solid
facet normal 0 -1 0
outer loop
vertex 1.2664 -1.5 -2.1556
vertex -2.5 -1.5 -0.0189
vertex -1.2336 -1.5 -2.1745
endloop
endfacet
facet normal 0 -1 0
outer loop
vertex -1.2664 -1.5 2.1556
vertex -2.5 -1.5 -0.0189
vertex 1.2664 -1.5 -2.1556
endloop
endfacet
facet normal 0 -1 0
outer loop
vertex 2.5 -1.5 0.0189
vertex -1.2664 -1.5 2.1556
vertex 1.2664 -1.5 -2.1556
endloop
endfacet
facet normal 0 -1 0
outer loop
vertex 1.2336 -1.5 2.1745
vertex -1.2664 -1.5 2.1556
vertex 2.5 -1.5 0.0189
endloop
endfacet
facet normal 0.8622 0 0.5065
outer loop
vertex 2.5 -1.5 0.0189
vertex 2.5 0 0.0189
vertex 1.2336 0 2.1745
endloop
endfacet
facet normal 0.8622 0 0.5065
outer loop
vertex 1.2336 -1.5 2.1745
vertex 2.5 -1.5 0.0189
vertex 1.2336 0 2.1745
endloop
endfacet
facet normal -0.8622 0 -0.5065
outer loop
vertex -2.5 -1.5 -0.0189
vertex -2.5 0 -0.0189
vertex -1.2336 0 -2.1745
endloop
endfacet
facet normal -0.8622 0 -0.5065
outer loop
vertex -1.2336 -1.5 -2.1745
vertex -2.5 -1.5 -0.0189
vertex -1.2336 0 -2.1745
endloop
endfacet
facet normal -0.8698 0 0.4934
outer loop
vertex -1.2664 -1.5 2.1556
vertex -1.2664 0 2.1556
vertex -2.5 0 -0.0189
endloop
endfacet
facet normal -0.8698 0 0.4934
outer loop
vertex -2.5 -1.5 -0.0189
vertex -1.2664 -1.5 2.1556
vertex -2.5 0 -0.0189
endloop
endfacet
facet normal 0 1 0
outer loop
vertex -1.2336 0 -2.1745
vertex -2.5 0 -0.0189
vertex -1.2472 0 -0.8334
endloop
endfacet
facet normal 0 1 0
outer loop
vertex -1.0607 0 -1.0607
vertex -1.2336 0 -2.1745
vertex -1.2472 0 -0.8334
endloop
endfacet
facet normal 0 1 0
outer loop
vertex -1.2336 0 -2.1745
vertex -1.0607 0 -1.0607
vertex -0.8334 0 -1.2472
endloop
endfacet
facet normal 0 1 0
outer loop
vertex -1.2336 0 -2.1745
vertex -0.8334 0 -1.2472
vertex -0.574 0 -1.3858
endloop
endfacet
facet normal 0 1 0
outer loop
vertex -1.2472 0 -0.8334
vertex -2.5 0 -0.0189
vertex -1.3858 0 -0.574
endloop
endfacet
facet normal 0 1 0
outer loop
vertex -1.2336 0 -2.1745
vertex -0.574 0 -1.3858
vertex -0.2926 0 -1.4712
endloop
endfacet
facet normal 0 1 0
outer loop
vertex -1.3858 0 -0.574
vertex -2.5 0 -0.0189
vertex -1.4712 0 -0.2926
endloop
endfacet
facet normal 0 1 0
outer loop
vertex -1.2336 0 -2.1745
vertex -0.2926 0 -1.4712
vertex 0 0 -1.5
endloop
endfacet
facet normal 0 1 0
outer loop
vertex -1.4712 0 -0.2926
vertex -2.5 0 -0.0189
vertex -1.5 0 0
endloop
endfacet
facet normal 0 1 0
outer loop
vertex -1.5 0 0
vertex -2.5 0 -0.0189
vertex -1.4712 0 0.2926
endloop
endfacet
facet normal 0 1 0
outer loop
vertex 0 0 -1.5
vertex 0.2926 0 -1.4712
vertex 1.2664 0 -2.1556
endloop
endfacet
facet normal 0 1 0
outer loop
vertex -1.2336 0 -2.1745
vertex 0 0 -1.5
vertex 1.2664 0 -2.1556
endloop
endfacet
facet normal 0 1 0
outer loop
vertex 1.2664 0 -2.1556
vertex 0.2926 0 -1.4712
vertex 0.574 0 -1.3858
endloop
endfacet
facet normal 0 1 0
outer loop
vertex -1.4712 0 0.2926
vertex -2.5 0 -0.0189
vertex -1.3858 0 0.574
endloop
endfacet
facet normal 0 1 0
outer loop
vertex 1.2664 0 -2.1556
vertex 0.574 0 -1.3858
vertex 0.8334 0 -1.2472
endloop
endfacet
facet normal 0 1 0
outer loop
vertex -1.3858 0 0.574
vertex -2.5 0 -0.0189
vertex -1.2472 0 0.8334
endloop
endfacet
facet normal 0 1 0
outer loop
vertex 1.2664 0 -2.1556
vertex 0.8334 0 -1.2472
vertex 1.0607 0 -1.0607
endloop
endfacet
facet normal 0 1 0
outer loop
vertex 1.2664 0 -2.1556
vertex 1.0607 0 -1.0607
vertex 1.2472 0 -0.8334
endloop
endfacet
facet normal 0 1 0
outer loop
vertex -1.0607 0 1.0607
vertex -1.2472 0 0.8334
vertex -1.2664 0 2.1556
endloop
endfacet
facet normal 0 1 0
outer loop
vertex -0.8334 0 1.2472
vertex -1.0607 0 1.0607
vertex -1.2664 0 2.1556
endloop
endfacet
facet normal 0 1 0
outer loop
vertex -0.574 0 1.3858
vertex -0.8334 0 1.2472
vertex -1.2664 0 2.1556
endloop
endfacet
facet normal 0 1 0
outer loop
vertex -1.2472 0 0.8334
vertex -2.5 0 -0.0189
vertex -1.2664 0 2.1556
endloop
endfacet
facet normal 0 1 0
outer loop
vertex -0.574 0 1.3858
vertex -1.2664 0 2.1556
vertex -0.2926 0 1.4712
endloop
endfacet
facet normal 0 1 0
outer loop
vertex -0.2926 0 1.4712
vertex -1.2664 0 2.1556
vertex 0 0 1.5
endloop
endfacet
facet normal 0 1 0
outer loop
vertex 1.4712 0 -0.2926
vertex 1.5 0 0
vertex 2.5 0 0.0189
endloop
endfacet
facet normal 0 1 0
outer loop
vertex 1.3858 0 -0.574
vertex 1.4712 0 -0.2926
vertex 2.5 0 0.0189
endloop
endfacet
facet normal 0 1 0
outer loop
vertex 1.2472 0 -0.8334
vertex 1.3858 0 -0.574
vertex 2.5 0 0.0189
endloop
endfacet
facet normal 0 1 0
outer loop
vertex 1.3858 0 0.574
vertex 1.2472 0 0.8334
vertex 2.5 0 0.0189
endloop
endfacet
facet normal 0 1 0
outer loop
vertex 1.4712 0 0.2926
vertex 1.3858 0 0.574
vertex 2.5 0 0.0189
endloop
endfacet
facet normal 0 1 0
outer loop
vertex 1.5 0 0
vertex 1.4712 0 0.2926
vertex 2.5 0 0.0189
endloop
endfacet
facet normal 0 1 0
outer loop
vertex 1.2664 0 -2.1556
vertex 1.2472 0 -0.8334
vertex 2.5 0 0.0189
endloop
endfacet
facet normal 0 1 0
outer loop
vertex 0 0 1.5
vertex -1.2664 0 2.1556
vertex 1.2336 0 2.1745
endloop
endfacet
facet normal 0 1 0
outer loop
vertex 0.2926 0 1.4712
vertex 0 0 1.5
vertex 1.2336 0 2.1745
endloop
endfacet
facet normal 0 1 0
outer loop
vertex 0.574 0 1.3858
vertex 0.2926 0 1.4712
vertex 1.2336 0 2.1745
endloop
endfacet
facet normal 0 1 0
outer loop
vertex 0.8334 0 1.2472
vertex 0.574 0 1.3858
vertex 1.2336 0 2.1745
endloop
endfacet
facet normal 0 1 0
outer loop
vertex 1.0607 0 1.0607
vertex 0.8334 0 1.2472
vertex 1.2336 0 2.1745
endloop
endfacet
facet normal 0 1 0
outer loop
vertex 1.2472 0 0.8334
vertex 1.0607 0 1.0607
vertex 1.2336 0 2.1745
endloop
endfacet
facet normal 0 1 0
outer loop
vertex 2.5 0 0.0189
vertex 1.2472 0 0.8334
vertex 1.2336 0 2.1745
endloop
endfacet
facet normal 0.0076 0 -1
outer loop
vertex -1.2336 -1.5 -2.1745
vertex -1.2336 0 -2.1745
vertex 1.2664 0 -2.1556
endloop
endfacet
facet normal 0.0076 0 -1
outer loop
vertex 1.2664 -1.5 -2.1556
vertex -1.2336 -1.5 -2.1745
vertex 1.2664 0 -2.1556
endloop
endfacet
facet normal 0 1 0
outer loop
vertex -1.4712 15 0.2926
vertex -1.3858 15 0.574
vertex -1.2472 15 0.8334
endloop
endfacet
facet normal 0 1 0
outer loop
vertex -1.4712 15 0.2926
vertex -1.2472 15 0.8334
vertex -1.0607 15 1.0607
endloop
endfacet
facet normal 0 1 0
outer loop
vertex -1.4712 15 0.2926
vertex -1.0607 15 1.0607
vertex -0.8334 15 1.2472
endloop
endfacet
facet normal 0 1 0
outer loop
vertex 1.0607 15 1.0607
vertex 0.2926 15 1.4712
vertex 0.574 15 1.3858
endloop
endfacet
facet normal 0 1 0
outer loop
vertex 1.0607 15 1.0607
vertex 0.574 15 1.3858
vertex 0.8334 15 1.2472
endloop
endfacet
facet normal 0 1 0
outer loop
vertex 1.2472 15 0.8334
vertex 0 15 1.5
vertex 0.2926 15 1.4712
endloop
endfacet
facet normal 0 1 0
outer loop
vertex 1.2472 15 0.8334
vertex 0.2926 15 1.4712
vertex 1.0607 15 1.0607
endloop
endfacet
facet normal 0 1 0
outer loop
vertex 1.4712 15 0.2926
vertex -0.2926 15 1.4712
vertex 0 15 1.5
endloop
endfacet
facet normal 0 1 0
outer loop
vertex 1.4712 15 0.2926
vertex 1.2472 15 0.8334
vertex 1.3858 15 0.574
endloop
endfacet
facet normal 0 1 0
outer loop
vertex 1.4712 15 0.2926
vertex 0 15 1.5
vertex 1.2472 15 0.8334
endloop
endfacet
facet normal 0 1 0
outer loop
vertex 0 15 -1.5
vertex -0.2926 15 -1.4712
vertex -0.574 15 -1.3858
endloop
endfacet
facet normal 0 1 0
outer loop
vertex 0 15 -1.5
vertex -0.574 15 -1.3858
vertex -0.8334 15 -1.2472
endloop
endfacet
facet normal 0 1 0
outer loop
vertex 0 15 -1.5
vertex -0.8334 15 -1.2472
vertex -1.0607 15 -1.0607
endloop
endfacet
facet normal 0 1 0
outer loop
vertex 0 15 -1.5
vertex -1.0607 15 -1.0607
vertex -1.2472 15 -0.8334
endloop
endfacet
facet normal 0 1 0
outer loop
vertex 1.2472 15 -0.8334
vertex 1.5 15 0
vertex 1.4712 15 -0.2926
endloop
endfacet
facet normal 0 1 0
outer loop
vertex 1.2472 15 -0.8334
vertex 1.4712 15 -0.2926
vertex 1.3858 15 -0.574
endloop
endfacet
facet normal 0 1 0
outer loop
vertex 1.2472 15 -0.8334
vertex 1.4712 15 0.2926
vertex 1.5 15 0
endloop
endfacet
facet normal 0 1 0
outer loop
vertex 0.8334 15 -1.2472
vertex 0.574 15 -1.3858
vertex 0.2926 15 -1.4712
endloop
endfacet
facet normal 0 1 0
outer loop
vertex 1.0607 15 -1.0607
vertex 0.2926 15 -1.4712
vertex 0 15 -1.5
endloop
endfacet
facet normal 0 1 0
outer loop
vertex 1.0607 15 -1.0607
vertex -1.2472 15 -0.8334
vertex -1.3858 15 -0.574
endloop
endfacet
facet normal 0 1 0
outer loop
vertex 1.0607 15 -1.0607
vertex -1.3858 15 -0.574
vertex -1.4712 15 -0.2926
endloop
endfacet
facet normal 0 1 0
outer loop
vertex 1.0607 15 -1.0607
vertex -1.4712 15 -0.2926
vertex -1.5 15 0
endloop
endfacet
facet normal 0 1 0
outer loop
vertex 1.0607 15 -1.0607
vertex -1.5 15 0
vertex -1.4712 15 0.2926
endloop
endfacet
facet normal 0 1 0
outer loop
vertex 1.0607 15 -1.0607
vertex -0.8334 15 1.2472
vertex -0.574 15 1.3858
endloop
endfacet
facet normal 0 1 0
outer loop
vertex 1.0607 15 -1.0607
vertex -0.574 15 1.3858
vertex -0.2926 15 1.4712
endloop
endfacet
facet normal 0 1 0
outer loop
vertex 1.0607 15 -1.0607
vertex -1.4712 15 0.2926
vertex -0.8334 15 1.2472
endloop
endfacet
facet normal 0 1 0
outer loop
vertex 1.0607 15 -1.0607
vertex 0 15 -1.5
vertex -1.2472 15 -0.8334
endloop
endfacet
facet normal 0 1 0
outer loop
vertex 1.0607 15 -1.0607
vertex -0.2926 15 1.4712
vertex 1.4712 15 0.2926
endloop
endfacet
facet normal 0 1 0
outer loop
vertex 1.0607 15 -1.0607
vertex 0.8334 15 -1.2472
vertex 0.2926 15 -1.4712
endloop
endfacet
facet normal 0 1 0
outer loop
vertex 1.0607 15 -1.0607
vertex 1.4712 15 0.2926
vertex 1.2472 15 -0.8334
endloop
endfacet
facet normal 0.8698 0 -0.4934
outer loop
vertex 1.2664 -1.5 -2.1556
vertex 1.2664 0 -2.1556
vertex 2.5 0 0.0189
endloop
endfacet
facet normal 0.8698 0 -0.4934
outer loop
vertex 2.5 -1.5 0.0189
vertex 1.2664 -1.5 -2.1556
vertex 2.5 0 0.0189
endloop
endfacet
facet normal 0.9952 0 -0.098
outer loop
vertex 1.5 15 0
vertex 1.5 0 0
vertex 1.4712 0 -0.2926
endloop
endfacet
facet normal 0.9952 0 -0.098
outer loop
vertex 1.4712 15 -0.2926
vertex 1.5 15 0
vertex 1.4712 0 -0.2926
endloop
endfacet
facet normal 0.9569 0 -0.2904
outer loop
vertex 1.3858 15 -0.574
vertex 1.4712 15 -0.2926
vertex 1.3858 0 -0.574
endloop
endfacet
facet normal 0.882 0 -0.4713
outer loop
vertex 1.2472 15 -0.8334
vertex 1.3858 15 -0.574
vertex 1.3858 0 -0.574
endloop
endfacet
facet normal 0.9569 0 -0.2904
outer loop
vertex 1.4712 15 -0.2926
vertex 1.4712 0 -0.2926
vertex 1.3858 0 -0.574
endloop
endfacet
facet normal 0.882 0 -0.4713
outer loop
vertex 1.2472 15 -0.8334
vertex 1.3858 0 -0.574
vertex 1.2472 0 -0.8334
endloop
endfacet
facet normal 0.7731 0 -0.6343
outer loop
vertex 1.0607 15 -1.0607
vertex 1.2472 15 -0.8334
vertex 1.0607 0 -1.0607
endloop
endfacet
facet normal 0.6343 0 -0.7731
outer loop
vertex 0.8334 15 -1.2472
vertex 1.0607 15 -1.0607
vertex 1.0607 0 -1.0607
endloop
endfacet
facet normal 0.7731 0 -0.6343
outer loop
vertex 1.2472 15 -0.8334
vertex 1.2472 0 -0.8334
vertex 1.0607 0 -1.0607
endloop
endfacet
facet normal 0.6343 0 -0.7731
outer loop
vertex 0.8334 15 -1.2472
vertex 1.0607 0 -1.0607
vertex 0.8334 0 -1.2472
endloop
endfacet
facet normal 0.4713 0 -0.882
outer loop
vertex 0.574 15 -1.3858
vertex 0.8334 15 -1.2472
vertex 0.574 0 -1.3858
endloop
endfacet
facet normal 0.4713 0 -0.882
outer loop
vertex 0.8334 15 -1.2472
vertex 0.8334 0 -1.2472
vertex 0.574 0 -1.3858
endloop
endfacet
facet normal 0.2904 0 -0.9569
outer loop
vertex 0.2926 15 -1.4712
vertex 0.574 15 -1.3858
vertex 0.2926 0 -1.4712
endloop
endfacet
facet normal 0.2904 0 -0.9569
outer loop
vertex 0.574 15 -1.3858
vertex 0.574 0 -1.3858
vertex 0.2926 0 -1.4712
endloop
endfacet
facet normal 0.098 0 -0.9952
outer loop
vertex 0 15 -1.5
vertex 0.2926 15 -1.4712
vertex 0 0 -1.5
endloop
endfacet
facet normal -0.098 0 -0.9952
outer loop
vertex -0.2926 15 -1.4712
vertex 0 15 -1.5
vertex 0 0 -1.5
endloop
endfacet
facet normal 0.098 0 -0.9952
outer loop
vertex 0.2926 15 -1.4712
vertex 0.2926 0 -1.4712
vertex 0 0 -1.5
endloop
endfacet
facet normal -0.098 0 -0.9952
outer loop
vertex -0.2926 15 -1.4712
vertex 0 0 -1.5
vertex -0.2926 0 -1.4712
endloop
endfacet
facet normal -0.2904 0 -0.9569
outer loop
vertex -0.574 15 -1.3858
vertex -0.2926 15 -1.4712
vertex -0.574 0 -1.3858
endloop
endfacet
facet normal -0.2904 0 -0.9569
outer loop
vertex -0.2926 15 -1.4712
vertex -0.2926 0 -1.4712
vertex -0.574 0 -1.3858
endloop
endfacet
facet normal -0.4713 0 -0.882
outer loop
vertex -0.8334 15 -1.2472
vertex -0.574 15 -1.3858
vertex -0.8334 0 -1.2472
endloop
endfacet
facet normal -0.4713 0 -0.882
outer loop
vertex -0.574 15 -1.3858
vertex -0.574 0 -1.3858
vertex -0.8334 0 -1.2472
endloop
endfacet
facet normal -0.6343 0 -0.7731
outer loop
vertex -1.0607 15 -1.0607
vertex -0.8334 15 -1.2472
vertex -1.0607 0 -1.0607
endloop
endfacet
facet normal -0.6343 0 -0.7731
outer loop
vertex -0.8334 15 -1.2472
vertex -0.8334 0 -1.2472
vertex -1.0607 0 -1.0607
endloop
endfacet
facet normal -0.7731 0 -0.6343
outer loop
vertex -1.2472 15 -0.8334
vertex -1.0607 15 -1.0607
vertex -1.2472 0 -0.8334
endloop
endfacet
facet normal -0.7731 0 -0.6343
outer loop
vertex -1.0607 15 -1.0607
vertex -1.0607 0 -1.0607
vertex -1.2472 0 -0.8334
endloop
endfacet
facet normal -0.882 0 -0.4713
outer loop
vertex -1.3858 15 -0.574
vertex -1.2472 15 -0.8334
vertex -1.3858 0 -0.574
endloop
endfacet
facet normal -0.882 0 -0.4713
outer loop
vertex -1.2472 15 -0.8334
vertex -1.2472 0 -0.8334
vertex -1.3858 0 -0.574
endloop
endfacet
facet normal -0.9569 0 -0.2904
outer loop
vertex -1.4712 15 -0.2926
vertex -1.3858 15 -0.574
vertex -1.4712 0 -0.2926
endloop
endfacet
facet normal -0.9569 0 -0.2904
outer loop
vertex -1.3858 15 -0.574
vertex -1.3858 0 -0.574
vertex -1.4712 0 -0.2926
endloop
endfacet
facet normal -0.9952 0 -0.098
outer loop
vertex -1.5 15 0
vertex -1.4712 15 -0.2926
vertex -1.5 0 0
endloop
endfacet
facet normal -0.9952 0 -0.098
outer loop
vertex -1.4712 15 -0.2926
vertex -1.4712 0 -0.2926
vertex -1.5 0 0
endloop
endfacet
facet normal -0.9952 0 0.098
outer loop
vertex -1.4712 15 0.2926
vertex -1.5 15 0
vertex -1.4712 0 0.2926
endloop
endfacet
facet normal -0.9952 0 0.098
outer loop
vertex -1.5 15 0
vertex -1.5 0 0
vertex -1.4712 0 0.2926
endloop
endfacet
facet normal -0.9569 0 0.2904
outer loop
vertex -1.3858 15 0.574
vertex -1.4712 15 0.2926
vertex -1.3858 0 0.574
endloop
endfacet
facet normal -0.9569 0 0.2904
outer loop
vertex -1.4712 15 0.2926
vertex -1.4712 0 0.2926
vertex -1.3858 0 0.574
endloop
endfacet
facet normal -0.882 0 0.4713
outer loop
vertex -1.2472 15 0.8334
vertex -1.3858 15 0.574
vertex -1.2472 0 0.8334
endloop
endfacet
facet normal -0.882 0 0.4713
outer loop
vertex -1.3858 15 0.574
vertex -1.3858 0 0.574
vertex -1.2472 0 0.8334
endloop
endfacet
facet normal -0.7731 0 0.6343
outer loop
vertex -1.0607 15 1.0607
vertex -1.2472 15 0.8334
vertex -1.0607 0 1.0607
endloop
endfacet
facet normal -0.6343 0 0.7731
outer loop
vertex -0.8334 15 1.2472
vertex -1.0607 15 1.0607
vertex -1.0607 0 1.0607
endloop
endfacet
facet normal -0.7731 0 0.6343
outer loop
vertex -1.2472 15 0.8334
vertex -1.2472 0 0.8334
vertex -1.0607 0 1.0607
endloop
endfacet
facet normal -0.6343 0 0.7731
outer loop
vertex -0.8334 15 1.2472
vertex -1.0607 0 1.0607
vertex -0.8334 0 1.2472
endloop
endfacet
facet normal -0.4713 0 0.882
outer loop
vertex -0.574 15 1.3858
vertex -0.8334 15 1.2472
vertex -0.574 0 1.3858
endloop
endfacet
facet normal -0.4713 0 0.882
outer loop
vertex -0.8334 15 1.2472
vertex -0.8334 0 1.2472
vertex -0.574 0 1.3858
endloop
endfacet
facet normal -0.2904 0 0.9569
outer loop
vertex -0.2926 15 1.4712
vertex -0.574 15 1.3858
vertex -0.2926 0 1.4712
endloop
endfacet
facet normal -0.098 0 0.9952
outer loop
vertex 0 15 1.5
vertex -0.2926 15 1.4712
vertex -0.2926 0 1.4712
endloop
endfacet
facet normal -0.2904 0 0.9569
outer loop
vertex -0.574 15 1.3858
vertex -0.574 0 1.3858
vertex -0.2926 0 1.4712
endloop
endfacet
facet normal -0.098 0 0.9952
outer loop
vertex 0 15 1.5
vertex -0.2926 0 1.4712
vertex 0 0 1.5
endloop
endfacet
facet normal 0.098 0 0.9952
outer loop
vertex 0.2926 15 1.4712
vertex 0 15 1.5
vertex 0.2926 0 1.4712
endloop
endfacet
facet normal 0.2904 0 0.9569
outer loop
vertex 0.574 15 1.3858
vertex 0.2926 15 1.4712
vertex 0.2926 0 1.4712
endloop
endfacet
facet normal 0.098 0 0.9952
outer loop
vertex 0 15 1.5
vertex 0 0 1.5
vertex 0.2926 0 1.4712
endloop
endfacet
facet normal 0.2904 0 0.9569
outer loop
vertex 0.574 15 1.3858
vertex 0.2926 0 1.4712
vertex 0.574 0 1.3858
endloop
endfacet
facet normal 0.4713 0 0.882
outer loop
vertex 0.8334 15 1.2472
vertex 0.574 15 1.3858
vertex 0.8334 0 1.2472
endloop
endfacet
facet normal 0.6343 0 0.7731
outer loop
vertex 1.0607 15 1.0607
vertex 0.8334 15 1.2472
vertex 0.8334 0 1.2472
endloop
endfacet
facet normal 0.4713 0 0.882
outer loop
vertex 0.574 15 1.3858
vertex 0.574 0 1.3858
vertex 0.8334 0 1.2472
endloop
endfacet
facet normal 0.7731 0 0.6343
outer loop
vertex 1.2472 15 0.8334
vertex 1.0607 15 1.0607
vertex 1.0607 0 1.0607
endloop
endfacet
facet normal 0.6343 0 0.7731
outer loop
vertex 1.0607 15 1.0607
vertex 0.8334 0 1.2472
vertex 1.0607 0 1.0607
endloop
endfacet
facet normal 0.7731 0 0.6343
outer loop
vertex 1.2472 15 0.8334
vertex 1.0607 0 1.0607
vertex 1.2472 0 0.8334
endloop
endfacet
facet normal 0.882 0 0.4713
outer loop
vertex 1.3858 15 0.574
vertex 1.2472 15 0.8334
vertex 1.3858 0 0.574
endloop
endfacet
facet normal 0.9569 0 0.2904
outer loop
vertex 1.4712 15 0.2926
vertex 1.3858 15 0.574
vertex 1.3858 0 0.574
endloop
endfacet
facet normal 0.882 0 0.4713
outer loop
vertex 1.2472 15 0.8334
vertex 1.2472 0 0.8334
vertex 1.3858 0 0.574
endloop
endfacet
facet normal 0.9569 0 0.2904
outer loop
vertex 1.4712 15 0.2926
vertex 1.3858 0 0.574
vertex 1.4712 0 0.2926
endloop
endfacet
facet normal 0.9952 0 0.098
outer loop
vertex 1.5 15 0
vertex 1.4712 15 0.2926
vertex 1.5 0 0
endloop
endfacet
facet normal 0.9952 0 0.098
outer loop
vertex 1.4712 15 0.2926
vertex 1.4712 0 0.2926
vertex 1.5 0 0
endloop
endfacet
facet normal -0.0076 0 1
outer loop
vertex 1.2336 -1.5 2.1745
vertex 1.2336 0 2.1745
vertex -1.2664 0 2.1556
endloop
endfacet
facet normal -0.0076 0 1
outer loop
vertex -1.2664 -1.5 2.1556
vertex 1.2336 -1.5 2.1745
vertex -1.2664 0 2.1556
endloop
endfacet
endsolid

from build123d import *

# Parameters (mm, degrees)
SKETCH1_R           = 1.5
BOSS_EXTRUDE1_DEPTH = 15
BOSS_EXTRUDE2_DEPTH = 1.5


with BuildPart() as part:
    # Sketch1 → Boss-Extrude1 (new body)
    with BuildSketch(Plane(origin=(0, 0, 0), x_dir=(1, 0, 0), z_dir=(0, 1, 0))):
        Circle(SKETCH1_R)
    extrude(amount=BOSS_EXTRUDE1_DEPTH)

    # Sketch2 → Boss-Extrude2 (add)
    with BuildSketch(Plane.XZ):
        Polygon((2.5, 0.018896825), (1.23363487, 2.174511922), (-1.26636513, 2.155615097), (-2.5, -0.018896825), (-1.23363487, -2.174511922), (1.26636513, -2.155615097), align=None)
    extrude(amount=BOSS_EXTRUDE2_DEPTH)


solid = part.part
